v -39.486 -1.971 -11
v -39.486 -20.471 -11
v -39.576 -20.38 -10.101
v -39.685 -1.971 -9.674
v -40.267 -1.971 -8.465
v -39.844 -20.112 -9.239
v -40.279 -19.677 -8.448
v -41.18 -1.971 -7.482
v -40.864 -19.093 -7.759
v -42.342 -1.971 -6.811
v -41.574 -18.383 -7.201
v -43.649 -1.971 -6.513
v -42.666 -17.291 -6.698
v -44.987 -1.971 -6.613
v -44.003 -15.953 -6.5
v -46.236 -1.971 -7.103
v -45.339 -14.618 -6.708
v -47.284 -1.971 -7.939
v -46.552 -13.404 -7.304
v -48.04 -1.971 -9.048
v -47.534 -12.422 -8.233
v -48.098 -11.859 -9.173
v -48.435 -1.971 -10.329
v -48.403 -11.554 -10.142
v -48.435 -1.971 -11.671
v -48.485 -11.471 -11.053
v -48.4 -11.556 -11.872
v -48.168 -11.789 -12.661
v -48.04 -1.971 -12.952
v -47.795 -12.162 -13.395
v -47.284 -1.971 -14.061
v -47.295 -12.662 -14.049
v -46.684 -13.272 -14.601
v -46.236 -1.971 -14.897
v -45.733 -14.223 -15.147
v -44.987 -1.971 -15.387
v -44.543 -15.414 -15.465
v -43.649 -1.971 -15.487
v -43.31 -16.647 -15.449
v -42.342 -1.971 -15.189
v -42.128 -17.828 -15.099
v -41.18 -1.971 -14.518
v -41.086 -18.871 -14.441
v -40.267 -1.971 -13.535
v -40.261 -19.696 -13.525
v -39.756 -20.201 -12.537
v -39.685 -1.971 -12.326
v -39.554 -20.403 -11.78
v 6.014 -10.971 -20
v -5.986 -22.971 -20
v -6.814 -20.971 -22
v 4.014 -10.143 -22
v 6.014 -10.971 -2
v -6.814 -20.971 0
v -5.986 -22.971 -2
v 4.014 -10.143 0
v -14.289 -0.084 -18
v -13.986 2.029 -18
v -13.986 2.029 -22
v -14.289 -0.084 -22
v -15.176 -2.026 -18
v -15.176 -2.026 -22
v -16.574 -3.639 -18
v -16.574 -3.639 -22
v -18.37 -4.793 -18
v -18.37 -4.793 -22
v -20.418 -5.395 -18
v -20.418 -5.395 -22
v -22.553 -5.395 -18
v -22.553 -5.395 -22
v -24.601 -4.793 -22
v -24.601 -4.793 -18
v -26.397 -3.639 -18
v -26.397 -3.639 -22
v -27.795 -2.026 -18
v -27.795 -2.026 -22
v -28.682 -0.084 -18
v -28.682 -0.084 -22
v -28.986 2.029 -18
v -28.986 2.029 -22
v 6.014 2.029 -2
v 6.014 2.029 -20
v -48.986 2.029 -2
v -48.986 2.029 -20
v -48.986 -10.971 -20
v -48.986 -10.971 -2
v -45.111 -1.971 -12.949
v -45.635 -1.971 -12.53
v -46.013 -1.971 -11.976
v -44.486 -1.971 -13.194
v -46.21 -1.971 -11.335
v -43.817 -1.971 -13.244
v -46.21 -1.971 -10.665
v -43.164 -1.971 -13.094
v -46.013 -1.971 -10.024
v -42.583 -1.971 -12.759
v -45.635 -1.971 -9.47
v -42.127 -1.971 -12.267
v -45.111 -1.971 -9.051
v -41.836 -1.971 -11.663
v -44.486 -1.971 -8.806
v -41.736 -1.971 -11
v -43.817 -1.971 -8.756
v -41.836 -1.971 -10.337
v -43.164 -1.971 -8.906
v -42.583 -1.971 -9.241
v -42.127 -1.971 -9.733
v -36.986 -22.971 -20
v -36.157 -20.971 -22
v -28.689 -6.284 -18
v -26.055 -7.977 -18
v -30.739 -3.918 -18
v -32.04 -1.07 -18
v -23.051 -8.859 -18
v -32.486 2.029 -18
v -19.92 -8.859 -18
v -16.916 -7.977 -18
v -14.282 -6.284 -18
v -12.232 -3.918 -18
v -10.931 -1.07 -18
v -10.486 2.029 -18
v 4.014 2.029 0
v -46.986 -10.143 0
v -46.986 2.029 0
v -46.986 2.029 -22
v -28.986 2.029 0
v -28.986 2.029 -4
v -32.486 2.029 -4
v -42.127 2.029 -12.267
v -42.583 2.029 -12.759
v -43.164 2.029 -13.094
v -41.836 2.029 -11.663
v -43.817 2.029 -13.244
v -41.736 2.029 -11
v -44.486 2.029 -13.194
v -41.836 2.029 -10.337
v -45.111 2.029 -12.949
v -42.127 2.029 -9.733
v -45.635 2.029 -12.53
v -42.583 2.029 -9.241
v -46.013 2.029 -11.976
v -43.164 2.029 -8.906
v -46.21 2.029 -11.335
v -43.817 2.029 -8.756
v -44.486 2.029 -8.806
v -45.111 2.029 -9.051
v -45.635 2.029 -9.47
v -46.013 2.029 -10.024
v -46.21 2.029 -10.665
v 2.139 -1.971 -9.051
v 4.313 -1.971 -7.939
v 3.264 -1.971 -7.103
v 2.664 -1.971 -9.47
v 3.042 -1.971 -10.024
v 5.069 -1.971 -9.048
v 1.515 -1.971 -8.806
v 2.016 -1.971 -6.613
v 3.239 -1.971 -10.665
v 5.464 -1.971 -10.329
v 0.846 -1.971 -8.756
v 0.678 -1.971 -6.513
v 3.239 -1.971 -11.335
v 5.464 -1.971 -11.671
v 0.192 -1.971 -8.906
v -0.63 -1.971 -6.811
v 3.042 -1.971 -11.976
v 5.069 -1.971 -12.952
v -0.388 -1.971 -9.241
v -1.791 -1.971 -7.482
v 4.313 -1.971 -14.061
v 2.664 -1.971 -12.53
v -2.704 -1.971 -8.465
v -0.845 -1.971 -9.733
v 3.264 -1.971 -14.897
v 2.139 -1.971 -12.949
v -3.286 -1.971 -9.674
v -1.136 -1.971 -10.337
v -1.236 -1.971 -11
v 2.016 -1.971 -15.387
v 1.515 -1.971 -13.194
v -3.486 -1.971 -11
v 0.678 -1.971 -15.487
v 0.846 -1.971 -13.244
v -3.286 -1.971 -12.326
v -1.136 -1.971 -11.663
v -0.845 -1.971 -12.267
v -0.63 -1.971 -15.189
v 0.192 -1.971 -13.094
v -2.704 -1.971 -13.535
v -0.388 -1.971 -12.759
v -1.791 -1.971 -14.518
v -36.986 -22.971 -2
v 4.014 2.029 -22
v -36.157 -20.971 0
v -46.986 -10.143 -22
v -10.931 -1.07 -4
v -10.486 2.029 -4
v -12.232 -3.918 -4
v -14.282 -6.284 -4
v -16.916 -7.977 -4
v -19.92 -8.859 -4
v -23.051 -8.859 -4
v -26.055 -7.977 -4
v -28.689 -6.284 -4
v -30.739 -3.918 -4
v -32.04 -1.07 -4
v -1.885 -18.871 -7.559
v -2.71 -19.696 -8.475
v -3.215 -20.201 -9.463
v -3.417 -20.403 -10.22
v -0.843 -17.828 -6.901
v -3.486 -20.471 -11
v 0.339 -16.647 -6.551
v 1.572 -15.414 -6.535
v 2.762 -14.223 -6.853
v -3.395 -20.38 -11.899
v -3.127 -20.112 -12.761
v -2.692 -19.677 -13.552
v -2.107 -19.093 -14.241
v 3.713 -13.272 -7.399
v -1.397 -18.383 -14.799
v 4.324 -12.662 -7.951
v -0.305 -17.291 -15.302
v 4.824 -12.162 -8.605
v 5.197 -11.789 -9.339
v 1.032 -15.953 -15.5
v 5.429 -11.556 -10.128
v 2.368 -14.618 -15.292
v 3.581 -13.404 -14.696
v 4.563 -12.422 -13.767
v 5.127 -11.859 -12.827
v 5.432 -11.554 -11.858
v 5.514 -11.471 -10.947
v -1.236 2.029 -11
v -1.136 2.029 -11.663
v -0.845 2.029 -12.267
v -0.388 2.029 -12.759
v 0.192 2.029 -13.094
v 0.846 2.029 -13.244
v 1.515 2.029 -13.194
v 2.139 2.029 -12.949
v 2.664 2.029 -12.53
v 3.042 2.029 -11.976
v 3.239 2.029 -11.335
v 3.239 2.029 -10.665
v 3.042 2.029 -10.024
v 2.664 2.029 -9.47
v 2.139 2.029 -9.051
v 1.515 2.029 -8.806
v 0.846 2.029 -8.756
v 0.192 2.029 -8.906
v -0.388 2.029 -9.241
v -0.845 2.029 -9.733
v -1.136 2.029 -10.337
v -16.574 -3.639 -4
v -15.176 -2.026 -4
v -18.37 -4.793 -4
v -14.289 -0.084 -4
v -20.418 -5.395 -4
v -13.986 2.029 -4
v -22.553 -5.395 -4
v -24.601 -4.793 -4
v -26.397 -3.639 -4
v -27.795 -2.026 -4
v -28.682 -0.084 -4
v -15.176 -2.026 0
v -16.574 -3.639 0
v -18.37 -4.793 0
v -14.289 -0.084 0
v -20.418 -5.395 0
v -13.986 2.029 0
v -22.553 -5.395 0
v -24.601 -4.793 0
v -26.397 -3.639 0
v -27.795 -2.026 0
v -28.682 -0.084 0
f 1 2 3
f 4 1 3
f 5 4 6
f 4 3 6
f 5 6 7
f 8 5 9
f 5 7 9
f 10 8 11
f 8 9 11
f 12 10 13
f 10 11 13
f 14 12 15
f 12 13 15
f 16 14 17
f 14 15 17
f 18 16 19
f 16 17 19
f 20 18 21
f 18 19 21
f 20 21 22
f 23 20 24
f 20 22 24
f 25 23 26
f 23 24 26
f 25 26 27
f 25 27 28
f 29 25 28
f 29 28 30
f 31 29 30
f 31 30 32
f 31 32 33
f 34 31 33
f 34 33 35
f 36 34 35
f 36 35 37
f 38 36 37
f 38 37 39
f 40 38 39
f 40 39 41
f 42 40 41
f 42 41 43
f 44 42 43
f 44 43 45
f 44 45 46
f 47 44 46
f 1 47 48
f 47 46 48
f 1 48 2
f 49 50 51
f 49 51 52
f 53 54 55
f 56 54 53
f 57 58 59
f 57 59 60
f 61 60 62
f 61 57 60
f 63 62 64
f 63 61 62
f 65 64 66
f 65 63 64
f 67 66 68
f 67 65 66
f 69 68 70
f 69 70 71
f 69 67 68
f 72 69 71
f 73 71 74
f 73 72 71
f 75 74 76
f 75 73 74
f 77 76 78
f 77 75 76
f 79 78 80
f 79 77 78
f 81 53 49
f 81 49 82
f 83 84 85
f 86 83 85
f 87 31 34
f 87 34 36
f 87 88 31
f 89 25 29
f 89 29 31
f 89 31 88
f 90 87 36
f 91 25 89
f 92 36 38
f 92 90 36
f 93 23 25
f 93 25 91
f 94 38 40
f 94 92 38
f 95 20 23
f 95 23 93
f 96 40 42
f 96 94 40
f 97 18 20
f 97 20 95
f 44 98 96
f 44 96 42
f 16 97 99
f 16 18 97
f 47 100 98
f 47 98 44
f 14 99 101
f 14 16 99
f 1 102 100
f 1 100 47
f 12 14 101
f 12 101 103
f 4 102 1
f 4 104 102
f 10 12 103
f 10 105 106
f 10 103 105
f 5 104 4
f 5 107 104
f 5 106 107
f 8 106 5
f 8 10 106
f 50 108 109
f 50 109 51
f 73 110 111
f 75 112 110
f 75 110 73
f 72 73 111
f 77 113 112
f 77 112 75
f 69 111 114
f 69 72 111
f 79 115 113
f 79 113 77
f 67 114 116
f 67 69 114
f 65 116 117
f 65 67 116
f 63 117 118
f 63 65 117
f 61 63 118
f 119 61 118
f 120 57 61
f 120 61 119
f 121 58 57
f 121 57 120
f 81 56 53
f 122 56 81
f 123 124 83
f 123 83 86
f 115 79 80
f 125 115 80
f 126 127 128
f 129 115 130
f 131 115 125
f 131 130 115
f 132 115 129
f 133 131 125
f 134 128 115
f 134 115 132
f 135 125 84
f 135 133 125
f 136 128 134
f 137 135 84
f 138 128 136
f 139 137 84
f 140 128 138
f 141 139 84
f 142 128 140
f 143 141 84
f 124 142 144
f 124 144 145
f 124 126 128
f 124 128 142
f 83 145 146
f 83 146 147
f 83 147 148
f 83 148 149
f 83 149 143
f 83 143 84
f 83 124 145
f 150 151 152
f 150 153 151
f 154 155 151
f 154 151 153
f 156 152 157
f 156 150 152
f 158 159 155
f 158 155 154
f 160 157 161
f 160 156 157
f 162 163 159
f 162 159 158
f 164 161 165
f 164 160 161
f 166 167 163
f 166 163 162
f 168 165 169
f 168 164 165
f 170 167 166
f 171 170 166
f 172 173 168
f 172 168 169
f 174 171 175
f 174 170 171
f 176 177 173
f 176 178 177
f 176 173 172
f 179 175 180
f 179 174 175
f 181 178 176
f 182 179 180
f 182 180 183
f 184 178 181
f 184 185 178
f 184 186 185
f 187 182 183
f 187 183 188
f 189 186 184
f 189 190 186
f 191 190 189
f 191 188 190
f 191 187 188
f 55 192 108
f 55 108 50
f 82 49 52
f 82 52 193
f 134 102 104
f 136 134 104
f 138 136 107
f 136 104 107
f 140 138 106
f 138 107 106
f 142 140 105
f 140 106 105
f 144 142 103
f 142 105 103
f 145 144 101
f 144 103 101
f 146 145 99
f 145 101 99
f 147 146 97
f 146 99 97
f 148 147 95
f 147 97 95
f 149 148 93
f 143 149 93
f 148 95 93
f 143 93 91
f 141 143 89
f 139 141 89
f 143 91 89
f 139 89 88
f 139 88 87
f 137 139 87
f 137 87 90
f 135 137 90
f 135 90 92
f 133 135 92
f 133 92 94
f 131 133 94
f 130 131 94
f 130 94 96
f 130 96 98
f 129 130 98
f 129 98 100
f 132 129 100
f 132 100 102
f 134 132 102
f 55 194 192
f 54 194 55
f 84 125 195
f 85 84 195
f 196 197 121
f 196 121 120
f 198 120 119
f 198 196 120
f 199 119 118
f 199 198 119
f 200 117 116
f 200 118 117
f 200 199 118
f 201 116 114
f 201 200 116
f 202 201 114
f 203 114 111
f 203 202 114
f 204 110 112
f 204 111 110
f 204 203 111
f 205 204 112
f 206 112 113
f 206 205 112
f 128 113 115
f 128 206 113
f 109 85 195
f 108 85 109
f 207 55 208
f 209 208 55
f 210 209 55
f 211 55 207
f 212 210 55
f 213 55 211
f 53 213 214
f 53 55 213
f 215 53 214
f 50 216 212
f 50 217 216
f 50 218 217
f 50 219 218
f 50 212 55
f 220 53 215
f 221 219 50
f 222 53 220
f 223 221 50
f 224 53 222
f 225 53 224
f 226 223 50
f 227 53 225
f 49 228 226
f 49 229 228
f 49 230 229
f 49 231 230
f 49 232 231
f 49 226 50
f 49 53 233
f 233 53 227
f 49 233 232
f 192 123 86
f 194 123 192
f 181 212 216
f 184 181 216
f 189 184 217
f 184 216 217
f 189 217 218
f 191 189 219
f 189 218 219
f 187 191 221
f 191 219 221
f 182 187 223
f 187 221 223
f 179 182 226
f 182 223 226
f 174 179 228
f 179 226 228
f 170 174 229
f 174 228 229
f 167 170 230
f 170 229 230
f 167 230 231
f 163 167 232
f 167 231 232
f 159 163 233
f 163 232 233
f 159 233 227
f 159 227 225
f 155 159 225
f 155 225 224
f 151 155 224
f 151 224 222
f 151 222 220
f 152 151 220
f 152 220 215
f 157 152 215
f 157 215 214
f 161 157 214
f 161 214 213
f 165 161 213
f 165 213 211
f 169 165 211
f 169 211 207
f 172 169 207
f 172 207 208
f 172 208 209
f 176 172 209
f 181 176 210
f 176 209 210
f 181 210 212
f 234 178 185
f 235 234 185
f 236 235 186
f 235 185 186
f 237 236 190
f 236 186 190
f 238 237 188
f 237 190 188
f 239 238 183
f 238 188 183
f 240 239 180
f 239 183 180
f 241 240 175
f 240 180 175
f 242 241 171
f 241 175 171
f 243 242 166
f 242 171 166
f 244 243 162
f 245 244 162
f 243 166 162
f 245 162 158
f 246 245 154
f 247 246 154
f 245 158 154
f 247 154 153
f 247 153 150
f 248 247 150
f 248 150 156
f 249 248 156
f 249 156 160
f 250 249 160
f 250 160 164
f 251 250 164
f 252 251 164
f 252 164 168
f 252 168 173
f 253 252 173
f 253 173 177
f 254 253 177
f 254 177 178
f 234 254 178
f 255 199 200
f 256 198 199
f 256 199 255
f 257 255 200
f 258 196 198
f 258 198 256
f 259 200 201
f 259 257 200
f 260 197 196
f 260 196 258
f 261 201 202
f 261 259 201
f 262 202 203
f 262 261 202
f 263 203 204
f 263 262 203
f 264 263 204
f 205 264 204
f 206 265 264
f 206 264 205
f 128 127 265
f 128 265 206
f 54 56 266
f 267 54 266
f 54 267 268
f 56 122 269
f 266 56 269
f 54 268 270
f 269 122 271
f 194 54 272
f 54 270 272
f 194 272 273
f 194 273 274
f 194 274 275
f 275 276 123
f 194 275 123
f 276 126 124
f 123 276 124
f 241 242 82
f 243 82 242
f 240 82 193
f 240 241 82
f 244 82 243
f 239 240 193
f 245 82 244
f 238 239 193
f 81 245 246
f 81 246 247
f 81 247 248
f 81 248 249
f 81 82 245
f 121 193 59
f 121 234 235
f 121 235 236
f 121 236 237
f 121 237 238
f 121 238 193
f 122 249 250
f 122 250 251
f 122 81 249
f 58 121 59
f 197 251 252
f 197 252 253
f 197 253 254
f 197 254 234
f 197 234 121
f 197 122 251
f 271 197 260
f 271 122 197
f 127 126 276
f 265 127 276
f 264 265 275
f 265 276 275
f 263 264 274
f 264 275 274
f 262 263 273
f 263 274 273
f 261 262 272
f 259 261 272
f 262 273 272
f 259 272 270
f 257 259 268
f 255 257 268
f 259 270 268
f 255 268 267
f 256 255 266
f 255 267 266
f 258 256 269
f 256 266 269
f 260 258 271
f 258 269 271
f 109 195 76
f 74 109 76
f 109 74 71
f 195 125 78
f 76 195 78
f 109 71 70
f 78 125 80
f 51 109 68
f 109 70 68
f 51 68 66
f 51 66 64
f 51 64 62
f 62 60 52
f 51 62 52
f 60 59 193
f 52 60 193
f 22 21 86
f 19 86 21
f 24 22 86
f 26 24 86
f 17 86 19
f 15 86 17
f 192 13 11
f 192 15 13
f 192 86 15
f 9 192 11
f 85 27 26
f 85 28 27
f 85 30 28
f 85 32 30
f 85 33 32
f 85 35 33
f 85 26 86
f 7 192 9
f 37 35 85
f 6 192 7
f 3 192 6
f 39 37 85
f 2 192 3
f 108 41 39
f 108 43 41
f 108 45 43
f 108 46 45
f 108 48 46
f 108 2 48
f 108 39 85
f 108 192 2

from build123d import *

# Parameters (mm, degrees)
BOSS_EXTRUDE1_DEPTH = 22
CHAMFER1_SIZE       = 12
SKETCH2_R           = 2.25
CUT_EXTRUDE1_DEPTH  = 25
SKETCH2_4_R         = 4.5
SKETCH2_4_R_2       = 2.25
CUT_EXTRUDE2_DEPTH  = 21
CHAMFER2_SIZE       = 2
BOSS_EXTRUDE2_START = -22
BOSS_EXTRUDE2_DEPTH = 22
BOSS_EXTRUDE3_DEPTH = 4
BOSS_EXTRUDE4_START = -4
BOSS_EXTRUDE4_DEPTH = 4


with BuildPart() as part:
    # Sketch1 → Boss-Extrude1 (new body)
    with BuildSketch(Plane(origin=(0, 0, 0), x_dir=(1, 0, 0), z_dir=(0, 0, -1))):
        with BuildLine():
            Line((-38.985549133, -2.028901734), (-48.985549133, -2.028901734))
            Line((-48.985549133, -2.028901734), (-48.985549133, 22.971098266))
            Line((-48.985549133, 22.971098266), (6.014450867, 22.971098266))
            Line((6.014450867, 22.971098266), (6.014450867, -2.028901734))
            Line((6.014450867, -2.028901734), (-3.985549133, -2.028901734))
            ThreePointArc((-3.985549133, -2.028901734), (-21.485549133, 15.471098266), (-38.985549133, -2.028901734))
        make_face()
    extrude(amount=BOSS_EXTRUDE1_DEPTH)

    # Chamfer1
    chamfer1_edges = [part.edges().sort_by_distance(p)[0] for p in [
        (-48.985549133, -22.971098266, -11),
        (6.014450867, -22.971098266, -11),
    ]]
    chamfer(chamfer1_edges, length=CHAMFER1_SIZE)

    # Sketch2 → Cut-Extrude1 (cut)
    with BuildSketch(Plane(origin=(0, -22.971098266, 0), x_dir=(-1, 0, 0), z_dir=(0, -1, 0))):
        with Locations(Location((43.985549133, 11, 0), (0, 0, 180))):
            Circle(SKETCH2_R)
        with Locations((-1.014450867, 11)):
            Circle(SKETCH2_R)
    extrude(amount=-CUT_EXTRUDE1_DEPTH, mode=Mode.SUBTRACT)

    # Sketch2<4> → Cut-Extrude2 (cut)
    # profile 1 of 2: a face of its own
    with BuildSketch(Plane(origin=(0, -22.971098266, 0), x_dir=(-1, 0, 0), z_dir=(0, -1, 0))):
        with Locations(Location((43.985549133, 11, 0), (0, 0, 180))):
            Circle(SKETCH2_4_R)
        with Locations(Location((43.985549133, 11, 0), (0, 0, 180))):
            Circle(SKETCH2_4_R_2, mode=Mode.SUBTRACT)
    # profile 2 of 2: a face of its own
    with BuildSketch(Plane(origin=(0, -22.971098266, 0), x_dir=(-1, 0, 0), z_dir=(0, -1, 0))):
        with Locations((-1.014450867, 11)):
            Circle(SKETCH2_4_R)
        with Locations(Location((-1.014450867, 11, 0), (0, 0, 180))):
            Circle(SKETCH2_4_R_2, mode=Mode.SUBTRACT)
    extrude(amount=-CUT_EXTRUDE2_DEPTH, mode=Mode.SUBTRACT)

    # Chamfer2
    chamfer2_edges = [part.edges().sort_by_distance(p)[0] for p in [
        (6.014450867, -4.471098266, -22),
        (-21.485549133, -22.971098266, 0),
        (-21.485549133, -22.971098266, -22),
        (-48.985549133, -4.471098266, 0),
        (-42.985549133, -16.971098266, 0),
        (0.014450867, -16.971098266, 0),
        (-48.985549133, -4.471098266, -22),
        (-42.985549133, -16.971098266, -22),
        (0.014450867, -16.971098266, -22),
        (6.014450867, -4.471098266, 0),
    ]]
    chamfer(chamfer2_edges, length=CHAMFER2_SIZE)

    # Sketch3 → Boss-Extrude2 (add)
    with BuildSketch(Plane(origin=(0, 0, -22), x_dir=(-1, 0, 0), z_dir=(0, 0, -1)).offset(BOSS_EXTRUDE2_START)):
        with BuildLine():
            Line((3.985549133, 2.028901734), (10.485549133, 2.028901734))
            ThreePointArc((10.485549133, 2.028901734), (21.485549133, -8.971098266), (32.485549133, 2.028901734))
            Line((32.485549133, 2.028901734), (38.985549133, 2.028901734))
            ThreePointArc((38.985549133, 2.028901734), (21.485549133, -15.471098266), (3.985549133, 2.028901734))
        make_face()
    extrude(amount=BOSS_EXTRUDE2_DEPTH)

    # Sketch4 → Boss-Extrude3 (add)
    with BuildSketch(Plane.XY):
        with BuildLine():
            Line((-32.485549133, 2.028901734), (-28.985549133, 2.028901734))
            ThreePointArc((-28.985549133, 2.028901734), (-21.485549133, -5.471098266), (-13.985549133, 2.028901734))
            Line((-13.985549133, 2.028901734), (-10.485549133, 2.028901734))
            ThreePointArc((-10.485549133, 2.028901734), (-21.485549133, -8.971098266), (-32.485549133, 2.028901734))
        make_face()
    extrude(amount=-BOSS_EXTRUDE3_DEPTH)

    # Sketch5 → Boss-Extrude4 (add)
    with BuildSketch(Plane(origin=(0, 0, -22), x_dir=(-1, 0, 0), z_dir=(0, 0, -1)).offset(BOSS_EXTRUDE4_START)):
        with BuildLine():
            Line((10.485549133, 2.028901734), (13.985549133, 2.028901734))
            ThreePointArc((13.985549133, 2.028901734), (21.485549133, -5.471098266), (28.985549133, 2.028901734))
            Line((28.985549133, 2.028901734), (32.485549133, 2.028901734))
            ThreePointArc((32.485549133, 2.028901734), (21.485549133, -8.971098266), (10.485549133, 2.028901734))
        make_face()
    extrude(amount=BOSS_EXTRUDE4_DEPTH)


solid = part.part
